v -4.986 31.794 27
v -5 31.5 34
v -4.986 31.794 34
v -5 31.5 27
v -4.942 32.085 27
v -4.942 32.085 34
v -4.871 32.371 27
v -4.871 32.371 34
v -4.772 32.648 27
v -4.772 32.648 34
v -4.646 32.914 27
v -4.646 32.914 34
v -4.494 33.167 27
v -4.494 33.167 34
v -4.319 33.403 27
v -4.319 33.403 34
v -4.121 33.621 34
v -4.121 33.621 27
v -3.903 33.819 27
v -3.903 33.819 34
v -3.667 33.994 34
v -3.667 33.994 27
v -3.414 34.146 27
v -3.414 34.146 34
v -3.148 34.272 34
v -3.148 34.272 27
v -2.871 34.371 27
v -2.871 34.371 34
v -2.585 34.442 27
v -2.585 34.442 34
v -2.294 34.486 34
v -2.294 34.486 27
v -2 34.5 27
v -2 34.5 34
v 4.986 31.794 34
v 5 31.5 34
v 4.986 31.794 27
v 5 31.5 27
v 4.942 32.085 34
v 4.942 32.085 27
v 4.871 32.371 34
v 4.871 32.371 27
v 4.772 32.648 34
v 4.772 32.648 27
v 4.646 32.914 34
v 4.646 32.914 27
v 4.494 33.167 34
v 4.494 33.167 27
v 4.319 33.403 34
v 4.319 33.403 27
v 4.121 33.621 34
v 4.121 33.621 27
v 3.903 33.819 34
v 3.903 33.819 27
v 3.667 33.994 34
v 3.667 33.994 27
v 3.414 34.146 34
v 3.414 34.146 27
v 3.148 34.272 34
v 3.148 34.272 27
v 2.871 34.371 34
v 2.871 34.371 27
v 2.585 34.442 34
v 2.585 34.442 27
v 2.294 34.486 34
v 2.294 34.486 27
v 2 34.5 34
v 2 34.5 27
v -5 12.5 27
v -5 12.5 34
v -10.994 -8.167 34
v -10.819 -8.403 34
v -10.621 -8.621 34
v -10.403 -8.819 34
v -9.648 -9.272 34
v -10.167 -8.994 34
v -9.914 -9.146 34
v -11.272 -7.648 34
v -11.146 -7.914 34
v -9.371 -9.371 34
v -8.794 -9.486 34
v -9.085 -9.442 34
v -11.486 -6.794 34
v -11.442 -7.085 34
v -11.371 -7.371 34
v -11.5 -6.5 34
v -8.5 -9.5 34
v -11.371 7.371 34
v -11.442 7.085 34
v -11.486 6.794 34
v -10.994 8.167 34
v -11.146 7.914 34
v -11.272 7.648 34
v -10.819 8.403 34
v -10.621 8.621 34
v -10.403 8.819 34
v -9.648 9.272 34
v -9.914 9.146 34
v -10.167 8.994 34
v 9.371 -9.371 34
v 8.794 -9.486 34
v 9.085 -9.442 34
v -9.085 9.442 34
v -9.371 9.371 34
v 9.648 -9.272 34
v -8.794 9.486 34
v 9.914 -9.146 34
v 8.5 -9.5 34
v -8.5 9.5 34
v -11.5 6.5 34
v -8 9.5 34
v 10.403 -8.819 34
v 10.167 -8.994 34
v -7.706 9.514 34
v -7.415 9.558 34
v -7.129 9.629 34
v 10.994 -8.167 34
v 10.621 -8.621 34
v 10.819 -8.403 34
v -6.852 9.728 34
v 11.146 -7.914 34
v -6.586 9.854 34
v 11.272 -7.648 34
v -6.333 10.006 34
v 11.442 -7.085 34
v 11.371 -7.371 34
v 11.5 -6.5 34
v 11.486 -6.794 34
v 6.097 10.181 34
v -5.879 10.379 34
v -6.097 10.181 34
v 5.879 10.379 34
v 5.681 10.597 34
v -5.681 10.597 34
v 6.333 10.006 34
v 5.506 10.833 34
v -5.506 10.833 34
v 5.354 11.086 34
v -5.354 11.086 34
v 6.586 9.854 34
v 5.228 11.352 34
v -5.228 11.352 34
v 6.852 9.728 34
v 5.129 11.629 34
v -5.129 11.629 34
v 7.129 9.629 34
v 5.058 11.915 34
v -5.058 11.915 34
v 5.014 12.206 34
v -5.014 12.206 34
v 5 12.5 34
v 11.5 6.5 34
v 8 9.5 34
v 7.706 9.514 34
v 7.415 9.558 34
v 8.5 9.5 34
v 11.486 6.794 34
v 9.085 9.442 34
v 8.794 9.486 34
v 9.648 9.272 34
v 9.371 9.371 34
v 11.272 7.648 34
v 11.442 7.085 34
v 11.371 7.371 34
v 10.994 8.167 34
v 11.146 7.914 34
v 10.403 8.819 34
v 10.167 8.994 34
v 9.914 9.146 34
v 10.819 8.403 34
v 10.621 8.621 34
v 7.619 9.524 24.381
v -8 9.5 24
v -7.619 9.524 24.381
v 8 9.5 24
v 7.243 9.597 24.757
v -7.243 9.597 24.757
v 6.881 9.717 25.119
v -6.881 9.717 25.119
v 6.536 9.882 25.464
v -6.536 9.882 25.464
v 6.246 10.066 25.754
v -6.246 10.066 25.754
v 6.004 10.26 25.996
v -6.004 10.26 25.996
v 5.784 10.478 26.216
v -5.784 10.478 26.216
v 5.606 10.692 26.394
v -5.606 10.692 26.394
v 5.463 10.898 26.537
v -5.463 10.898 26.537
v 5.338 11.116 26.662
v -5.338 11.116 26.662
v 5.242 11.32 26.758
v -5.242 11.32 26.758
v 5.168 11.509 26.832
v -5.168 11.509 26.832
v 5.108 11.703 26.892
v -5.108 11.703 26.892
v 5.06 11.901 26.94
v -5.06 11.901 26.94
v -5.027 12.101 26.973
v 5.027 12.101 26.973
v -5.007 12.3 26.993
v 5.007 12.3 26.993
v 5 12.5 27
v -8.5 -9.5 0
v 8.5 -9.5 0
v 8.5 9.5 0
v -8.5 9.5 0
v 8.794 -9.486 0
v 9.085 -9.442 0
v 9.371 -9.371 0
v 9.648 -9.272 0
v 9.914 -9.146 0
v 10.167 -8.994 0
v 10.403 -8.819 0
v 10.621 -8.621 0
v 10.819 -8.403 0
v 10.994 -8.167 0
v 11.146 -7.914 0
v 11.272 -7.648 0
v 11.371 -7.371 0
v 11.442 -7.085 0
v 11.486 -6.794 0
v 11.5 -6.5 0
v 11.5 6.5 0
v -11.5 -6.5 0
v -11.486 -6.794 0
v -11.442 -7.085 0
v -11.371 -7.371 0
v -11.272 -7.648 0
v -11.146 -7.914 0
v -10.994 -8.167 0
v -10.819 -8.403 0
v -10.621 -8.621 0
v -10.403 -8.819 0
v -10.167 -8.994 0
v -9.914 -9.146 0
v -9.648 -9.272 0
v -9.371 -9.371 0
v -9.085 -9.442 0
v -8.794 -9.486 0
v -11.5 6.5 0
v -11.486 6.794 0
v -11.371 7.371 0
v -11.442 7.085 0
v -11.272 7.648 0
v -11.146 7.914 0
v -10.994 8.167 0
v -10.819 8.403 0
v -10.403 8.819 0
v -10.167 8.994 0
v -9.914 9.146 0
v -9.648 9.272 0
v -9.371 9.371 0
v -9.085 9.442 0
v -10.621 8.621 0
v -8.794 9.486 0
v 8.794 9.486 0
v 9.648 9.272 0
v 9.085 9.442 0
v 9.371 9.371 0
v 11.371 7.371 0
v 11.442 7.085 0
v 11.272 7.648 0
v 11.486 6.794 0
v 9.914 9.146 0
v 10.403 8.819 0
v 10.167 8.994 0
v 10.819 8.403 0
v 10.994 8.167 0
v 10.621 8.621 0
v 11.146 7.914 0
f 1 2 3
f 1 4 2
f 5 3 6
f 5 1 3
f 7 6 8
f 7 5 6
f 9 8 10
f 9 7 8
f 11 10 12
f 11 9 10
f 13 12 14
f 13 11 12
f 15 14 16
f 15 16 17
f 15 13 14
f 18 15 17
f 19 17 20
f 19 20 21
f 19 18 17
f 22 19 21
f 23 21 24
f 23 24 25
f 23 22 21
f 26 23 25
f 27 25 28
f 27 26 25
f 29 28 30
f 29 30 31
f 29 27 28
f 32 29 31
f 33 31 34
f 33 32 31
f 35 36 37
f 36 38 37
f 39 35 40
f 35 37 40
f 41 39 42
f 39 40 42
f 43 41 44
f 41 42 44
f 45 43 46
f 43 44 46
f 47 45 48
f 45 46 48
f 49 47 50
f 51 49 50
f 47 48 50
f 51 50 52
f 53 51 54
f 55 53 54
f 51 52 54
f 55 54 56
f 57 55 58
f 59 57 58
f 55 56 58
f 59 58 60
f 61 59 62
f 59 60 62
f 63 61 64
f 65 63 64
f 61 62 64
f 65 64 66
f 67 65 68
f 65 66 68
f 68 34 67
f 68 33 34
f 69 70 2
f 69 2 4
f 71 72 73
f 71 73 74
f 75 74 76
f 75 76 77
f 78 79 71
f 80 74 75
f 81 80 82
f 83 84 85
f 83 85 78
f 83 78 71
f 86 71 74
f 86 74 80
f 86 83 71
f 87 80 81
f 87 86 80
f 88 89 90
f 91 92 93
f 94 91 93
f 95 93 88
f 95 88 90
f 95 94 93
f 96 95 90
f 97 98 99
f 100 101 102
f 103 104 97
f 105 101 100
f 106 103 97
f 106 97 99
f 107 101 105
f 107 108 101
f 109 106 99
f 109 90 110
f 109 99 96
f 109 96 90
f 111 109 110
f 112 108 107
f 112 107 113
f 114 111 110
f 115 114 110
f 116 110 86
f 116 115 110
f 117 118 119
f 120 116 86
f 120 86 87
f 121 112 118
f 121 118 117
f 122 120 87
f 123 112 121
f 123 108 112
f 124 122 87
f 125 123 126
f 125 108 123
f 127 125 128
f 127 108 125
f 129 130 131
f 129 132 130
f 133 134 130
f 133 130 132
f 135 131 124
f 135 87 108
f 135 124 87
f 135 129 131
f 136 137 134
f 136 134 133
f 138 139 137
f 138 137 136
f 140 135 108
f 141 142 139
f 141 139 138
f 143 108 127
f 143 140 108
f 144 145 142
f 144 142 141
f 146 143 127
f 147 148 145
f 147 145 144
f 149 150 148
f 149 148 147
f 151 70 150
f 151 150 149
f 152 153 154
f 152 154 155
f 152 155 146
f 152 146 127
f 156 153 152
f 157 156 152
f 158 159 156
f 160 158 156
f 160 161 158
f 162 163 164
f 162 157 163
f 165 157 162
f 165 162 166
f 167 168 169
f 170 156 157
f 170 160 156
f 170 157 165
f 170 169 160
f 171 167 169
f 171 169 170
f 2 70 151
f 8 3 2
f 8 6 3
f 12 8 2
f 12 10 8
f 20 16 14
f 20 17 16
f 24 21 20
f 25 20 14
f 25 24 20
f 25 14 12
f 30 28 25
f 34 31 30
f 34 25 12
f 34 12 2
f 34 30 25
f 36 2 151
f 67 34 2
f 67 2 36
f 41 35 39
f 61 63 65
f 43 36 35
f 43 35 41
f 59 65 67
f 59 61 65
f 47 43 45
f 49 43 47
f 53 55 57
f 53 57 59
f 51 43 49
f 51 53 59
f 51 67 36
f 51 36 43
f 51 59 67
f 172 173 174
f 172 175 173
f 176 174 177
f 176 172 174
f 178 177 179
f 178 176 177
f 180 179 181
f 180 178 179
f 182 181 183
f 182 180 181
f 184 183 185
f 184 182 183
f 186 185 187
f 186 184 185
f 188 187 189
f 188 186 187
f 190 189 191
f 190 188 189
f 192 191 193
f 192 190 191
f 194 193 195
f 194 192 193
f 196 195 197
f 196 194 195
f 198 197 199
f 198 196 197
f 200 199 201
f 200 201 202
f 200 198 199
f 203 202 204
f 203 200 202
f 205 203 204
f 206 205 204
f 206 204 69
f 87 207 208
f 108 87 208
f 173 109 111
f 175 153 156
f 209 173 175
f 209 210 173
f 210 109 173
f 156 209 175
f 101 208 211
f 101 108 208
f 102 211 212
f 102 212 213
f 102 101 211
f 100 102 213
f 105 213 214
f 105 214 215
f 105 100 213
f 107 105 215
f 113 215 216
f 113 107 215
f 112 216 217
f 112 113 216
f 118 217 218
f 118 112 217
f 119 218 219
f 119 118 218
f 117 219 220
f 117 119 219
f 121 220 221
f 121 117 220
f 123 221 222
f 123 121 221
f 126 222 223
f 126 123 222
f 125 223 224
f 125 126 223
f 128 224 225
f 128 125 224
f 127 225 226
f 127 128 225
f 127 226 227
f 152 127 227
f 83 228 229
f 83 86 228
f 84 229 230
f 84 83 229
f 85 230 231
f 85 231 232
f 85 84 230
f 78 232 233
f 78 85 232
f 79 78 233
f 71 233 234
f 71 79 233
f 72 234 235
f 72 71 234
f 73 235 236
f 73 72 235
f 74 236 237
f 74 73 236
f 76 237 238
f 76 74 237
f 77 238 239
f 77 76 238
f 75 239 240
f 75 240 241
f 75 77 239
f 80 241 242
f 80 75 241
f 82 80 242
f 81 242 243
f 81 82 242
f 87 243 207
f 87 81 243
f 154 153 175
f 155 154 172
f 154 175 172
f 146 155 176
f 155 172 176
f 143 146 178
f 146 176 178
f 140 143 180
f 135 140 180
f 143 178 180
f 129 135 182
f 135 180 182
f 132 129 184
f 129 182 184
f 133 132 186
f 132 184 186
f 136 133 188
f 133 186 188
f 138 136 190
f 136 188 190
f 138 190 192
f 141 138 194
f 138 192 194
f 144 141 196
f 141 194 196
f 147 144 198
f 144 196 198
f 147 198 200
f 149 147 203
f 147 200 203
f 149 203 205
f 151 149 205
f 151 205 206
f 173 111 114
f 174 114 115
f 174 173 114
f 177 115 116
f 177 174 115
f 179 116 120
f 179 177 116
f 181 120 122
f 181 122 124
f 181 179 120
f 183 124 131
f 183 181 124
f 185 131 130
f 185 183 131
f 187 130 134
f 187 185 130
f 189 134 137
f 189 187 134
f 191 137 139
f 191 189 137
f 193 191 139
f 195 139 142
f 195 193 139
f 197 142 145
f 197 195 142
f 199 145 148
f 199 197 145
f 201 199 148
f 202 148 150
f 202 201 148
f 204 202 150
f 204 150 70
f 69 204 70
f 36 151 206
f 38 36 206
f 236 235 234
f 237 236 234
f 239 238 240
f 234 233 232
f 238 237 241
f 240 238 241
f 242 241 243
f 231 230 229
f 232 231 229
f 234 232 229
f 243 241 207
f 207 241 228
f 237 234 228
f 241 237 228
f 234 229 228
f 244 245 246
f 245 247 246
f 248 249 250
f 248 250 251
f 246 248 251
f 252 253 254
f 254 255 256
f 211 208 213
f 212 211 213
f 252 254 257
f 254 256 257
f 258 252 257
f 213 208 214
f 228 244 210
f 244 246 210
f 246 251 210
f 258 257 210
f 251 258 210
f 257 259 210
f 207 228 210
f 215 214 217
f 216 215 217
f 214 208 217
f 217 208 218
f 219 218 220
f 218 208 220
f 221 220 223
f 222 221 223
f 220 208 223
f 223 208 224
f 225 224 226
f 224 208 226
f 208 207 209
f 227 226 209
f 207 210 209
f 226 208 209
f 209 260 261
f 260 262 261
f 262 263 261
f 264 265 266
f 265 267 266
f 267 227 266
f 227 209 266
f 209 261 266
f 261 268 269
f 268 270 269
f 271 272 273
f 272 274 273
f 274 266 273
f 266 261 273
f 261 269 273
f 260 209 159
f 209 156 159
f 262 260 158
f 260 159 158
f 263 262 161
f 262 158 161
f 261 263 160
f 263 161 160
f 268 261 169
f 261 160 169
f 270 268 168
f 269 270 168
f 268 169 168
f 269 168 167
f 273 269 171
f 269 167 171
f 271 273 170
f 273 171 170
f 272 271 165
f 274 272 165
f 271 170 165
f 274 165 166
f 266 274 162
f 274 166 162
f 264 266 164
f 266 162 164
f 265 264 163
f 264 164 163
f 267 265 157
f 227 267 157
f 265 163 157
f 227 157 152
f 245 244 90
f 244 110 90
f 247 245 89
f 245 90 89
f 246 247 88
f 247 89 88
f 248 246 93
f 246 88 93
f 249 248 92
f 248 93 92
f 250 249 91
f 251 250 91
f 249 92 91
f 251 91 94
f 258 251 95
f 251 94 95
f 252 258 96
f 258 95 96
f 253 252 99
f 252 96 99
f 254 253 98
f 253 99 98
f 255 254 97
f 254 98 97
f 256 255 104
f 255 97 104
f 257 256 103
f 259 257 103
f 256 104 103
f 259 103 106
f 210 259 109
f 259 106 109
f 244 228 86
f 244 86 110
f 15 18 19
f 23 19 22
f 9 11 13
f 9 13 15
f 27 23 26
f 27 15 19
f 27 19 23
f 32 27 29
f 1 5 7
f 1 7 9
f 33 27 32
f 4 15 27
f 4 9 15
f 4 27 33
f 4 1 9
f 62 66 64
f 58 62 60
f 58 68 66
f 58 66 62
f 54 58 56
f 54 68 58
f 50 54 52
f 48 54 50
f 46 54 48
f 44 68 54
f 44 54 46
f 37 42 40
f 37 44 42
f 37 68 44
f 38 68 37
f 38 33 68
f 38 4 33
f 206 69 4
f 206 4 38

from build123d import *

# Parameters (mm, degrees)
SKETCH_1_W      = 23
SKETCH_1_H      = 19
EXTRUDE_1_DEPTH = 34
SKETCH_2_W      = 10
SKETCH_2_H      = 7
EXTRUDE_2_DEPTH = 25
FILLET_1_R      = 3


with BuildPart() as part:
    # Sketch 1 → Extrude 1 (new body)
    with BuildSketch(Plane.XY):
        Rectangle(SKETCH_1_W, SKETCH_1_H)
    extrude(amount=EXTRUDE_1_DEPTH)

    # Sketch 2 → Extrude 2 (add)
    with BuildSketch(Plane(origin=(0, 9.5, 0), x_dir=(1, 0, 0), z_dir=(0, 1, 0))):
        with Locations((0, -30.5)):
            Rectangle(SKETCH_2_W, SKETCH_2_H)
    extrude(amount=EXTRUDE_2_DEPTH)

    # Fillet 1
    fillet_1_edges = [part.edges().sort_by_distance(p)[0] for p in [
        (-5, 9.5, 30.5),
        (5, 9.5, 30.5),
        (0, 9.5, 27),
        (-5, 34.5, 30.5),
        (5, 34.5, 30.5),
        (11.5, -9.5, 17),
        (-11.5, -9.5, 17),
        (-11.5, 9.5, 17),
        (11.5, 9.5, 17),
    ]]
    fillet(fillet_1_edges, radius=FILLET_1_R)


solid = part.part
